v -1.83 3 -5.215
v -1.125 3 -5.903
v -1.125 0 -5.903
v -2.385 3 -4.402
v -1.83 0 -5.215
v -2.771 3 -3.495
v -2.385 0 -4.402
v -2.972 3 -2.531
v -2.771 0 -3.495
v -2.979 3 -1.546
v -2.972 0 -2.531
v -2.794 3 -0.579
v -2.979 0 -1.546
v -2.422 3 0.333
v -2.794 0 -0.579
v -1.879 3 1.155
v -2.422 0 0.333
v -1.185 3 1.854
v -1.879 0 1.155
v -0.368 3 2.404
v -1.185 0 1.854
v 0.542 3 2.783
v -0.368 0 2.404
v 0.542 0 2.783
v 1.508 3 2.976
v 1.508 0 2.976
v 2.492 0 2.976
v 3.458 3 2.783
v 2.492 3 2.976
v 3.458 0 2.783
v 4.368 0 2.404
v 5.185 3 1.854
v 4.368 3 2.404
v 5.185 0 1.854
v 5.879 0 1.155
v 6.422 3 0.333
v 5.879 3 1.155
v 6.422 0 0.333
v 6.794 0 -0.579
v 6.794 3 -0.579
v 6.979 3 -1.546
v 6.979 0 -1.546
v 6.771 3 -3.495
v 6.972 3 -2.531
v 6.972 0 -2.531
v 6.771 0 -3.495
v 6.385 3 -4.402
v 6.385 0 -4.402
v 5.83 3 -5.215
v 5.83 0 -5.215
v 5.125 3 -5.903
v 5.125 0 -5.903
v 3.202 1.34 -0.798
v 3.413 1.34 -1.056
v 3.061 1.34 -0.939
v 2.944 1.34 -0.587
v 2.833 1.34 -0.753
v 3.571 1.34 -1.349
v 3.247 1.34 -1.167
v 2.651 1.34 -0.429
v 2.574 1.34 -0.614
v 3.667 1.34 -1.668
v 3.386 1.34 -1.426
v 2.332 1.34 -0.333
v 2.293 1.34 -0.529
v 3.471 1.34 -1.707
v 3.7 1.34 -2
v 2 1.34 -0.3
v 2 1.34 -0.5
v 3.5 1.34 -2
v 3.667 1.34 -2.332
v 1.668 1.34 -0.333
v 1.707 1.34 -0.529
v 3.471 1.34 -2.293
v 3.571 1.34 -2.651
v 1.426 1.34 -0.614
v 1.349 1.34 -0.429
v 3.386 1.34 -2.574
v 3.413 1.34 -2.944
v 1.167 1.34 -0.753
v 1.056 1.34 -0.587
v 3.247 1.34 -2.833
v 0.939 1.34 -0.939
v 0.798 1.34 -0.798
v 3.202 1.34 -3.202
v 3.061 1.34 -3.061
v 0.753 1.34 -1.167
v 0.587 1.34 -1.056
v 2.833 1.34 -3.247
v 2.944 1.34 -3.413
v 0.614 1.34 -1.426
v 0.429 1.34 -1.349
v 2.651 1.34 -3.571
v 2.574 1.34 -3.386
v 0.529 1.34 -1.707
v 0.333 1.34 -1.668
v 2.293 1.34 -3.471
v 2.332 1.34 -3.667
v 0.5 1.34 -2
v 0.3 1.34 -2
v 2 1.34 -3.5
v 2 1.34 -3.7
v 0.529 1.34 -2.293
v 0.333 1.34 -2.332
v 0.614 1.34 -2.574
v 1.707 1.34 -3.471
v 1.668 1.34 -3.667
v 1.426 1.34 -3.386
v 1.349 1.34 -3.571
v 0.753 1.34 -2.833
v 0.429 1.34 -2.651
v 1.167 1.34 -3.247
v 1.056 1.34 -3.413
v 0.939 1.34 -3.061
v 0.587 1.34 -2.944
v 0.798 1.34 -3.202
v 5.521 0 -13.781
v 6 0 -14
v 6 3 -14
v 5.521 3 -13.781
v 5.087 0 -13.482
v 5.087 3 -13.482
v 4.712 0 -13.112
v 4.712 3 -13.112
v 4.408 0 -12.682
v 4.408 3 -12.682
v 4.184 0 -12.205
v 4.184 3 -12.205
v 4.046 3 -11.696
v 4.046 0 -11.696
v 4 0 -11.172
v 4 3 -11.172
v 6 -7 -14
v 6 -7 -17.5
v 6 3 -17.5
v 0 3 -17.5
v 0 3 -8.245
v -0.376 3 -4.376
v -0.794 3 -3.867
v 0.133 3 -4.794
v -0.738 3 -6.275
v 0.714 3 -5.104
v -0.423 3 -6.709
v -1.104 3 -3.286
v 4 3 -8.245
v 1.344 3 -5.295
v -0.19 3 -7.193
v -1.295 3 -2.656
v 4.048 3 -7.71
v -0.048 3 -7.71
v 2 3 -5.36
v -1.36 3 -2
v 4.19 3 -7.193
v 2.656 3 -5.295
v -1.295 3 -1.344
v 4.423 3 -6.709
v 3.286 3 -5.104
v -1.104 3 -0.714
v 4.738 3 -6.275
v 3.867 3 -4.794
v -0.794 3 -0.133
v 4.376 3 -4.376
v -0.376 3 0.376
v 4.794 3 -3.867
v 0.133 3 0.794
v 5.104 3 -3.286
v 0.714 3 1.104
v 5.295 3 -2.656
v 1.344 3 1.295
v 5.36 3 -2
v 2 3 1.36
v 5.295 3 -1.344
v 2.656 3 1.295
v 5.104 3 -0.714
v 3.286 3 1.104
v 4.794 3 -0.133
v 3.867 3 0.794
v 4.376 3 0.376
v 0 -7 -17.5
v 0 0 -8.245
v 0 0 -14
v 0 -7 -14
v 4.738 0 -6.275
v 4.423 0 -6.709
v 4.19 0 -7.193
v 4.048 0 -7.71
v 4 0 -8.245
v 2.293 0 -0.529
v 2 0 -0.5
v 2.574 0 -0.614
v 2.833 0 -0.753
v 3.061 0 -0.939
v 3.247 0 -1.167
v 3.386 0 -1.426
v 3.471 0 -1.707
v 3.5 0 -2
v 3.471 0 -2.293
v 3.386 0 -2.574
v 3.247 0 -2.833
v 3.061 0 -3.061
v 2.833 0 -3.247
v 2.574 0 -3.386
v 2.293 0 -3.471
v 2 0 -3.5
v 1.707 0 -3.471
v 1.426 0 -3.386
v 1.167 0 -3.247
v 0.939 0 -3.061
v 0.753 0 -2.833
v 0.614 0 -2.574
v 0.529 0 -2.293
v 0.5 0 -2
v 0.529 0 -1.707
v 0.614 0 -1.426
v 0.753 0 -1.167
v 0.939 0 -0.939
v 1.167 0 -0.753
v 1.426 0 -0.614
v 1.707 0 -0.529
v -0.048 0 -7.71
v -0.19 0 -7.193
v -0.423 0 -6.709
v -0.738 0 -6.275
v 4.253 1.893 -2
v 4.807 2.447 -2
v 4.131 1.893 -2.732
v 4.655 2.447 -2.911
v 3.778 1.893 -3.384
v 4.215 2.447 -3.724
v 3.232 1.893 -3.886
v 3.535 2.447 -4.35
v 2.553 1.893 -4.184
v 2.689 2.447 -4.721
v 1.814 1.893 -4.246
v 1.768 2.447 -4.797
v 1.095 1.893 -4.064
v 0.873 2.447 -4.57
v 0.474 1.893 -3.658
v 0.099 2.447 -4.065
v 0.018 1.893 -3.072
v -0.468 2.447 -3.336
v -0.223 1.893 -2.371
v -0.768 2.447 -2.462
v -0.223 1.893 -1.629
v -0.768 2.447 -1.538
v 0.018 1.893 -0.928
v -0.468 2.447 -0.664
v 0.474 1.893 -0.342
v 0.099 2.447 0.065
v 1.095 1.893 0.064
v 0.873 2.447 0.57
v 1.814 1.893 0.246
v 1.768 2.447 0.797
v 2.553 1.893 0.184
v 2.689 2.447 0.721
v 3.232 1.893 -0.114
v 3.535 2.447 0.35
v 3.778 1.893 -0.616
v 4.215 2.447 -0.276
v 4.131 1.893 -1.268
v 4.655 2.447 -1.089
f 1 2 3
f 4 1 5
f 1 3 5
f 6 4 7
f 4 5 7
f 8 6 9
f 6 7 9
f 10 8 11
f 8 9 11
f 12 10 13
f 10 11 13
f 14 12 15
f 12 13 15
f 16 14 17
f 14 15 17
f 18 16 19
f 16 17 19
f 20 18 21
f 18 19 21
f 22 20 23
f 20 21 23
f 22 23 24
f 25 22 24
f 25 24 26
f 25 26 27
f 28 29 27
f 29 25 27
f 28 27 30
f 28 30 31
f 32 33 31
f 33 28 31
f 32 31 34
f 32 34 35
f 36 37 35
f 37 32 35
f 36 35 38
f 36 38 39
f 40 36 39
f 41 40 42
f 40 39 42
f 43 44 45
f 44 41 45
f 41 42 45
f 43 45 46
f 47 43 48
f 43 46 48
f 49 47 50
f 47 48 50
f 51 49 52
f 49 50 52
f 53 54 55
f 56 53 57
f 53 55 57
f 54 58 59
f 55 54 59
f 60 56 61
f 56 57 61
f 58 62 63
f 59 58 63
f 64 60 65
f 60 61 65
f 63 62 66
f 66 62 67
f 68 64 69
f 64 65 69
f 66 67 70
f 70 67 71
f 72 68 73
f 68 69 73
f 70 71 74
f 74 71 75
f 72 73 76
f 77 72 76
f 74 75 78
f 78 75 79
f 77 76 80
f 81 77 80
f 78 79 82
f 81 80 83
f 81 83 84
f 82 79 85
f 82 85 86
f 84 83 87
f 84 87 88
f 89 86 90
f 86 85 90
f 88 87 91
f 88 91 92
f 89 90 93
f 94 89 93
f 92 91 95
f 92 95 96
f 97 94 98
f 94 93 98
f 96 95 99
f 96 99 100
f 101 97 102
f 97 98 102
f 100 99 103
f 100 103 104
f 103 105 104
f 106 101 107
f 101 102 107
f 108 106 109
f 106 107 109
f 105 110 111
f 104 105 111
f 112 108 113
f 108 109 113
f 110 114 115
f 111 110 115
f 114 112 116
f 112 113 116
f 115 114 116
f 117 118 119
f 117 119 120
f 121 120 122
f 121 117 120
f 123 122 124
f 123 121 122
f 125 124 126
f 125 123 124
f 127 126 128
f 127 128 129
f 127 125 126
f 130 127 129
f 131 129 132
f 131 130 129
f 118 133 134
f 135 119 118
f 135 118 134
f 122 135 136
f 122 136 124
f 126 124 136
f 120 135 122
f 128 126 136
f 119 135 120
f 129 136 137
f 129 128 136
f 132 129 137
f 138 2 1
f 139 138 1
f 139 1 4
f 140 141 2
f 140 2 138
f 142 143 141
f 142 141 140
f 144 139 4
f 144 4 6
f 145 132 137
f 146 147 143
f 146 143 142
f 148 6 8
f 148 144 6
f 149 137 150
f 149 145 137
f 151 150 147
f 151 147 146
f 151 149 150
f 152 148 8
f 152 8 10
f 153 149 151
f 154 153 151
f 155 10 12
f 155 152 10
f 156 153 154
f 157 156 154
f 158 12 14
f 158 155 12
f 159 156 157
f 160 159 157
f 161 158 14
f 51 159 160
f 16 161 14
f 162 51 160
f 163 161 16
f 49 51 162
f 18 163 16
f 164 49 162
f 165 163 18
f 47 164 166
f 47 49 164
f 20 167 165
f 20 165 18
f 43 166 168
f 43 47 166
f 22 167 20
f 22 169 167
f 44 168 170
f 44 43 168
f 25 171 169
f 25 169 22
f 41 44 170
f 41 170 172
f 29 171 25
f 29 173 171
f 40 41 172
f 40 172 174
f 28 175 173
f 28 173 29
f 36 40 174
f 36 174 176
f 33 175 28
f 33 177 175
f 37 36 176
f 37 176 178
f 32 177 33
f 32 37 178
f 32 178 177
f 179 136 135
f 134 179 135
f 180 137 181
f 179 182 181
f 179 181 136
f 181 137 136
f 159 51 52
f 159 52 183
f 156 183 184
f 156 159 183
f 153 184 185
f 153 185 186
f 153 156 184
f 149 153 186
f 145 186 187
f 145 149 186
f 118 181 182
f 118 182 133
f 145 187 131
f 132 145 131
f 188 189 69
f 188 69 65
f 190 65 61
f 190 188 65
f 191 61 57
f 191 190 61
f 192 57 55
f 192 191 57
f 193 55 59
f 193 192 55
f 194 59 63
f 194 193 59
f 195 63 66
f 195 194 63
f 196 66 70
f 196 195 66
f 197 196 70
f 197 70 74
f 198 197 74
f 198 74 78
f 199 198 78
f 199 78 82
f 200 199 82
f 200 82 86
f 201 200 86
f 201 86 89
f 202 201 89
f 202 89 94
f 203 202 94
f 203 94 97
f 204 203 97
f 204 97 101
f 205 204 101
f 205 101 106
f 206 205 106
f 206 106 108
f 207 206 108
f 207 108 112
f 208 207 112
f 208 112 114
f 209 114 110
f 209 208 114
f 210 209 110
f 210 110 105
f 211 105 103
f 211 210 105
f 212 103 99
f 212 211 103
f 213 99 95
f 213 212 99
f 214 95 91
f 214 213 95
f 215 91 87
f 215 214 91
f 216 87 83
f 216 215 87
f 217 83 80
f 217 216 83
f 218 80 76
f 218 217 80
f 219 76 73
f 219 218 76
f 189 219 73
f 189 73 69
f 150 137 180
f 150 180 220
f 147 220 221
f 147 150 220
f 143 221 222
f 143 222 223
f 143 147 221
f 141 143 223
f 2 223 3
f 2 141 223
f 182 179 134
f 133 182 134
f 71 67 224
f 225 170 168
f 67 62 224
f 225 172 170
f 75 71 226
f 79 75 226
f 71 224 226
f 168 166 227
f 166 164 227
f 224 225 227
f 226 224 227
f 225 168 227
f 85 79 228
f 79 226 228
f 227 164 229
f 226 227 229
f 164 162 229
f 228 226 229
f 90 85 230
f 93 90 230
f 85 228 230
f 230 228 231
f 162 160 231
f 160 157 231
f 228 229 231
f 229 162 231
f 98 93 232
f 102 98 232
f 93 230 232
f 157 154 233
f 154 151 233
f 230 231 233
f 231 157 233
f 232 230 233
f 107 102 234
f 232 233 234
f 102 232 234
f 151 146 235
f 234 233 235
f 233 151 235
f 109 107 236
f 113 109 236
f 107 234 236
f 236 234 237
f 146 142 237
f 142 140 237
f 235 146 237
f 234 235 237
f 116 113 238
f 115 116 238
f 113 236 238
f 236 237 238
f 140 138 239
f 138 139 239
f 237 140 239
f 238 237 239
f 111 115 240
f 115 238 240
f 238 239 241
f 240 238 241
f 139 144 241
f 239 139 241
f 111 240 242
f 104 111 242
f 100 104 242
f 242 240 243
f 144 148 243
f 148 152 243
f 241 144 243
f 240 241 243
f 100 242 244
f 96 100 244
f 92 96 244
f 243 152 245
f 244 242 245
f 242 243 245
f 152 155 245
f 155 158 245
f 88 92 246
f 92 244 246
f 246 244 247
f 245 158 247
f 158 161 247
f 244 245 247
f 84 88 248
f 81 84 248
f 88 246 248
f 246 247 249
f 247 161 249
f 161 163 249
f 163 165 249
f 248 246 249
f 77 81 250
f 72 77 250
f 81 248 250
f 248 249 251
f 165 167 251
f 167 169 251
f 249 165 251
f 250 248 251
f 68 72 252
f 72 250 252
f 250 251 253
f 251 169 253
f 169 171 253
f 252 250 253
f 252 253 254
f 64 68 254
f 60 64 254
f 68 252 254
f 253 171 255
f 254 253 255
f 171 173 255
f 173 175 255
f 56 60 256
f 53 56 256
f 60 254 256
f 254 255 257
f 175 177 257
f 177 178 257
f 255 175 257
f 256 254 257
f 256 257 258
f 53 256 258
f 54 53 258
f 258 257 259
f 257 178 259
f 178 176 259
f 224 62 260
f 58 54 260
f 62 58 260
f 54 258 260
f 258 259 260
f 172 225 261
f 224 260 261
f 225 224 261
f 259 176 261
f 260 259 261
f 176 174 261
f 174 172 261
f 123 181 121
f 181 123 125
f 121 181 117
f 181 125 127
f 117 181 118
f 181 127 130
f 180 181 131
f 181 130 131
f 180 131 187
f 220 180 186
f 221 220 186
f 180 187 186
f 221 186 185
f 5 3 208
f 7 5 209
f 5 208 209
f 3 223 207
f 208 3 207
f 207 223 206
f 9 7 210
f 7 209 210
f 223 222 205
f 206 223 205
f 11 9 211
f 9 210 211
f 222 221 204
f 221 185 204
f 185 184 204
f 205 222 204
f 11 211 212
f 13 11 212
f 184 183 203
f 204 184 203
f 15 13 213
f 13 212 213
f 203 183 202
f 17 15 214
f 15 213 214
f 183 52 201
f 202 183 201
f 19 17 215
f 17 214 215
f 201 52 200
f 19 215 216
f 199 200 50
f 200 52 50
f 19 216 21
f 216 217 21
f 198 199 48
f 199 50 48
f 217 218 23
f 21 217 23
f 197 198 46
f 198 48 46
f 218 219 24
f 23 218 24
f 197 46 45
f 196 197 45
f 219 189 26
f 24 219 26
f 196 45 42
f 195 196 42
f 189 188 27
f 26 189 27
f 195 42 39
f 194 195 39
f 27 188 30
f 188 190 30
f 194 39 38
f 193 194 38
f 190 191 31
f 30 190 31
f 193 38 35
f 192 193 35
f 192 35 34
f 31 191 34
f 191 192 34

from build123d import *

# Parameters (mm, degrees)
CROQUIS1_W              = 4
CROQUIS1_H              = 14
CROQUIS1_R              = 1.5
SALIENTE_EXTRUIR1_DEPTH = 3
CROQUIS2_W              = 6
CROQUIS2_H              = 3.5
SALIENTE_EXTRUIR2_DEPTH = 10
SALIENTE_EXTRUIR3_START = -3
CROQUIS3_R              = 5
CROQUIS3_R_2            = 1.5
SALIENTE_EXTRUIR3_DEPTH = 3
REDONDEO1_R             = 3


# Read off the part's stored shape, not the designer's step: TaladroAvanzado1
with BuildPart() as part:
    # Croquis1 → Saliente-Extruir1 (new body)
    with BuildSketch(Plane(origin=(0, 0, 0), x_dir=(1, 0, 0), z_dir=(0, 1, 0))):
        with Locations((2, 7)):
            Rectangle(CROQUIS1_W, CROQUIS1_H)
        with Locations(Location((2, 2, 0), (0, 0, 270))):
            Circle(CROQUIS1_R, mode=Mode.SUBTRACT)
    extrude(amount=SALIENTE_EXTRUIR1_DEPTH)

    # Croquis2 → Saliente-Extruir2 (add)
    with BuildSketch(Plane(origin=(0, 3, 0), x_dir=(1, 0, 0), z_dir=(0, 1, 0))):
        with Locations((3, 15.75)):
            Rectangle(CROQUIS2_W, CROQUIS2_H)
    extrude(amount=-SALIENTE_EXTRUIR2_DEPTH)

    # Croquis3 → Saliente-Extruir3 (add)
    with BuildSketch(Plane(origin=(0, 3, 0), x_dir=(1, 0, 0), z_dir=(0, 1, 0)).offset(SALIENTE_EXTRUIR3_START)):
        with Locations((2, 2)):
            Circle(CROQUIS3_R)
        with Locations(Location((2, 2, 0), (0, 0, 270))):
            Circle(CROQUIS3_R_2, mode=Mode.SUBTRACT)
    extrude(amount=SALIENTE_EXTRUIR3_DEPTH)

    # TaladroAvanzado1 outline → TaladroAvanzado1 (revolve, cut)
    with BuildSketch(Plane(origin=(2, 0, -2), x_dir=(1, 0, 0), z_dir=(0, 0, 1))):
        Polygon((1.5, 1.34), (1.7, 1.34), (3.36, 3), (1.5, 3), align=None)
    revolve(axis=Axis((2, 0, -2), (0, 1, 0)), mode=Mode.SUBTRACT)

    # Redondeo1
    # the kernel refuses this fillet: 3 mm, written as the material it adds along each edge
    with BuildSketch(Plane(origin=(4, 0, -14), x_dir=(1, 0, 0), z_dir=(0, 1, 0))) as redondeo1_piece_1:
        with BuildLine():
            CenterArc((3, -2.828427125), REDONDEO1_R, 109.471220634, 70.528779366)
            Line((0, -2.828427125), (-0.06, -2.828427125))
            Line((-0.06, -2.828427125), (-0.06, 0))
            Line((-0.06, 0), (0, 0.06))
            ThreePointArc((0, 0.06), (1, 0.06), (1.98, 0.056568542))
            Line((1.98, 0.056568542), (2, 0))
        make_face()
    extrude(amount=3)
    with BuildSketch(Plane(origin=(4, 3, -6.582575695), x_dir=(0, 0, -1), z_dir=(0, -1, 0))) as redondeo1_piece_2:
        with BuildLine():
            CenterArc((1.662422303, 3), REDONDEO1_R, 218.682187453, 51.317812547)
            Line((-0.679451946, 1.125), (-0.726289431, 1.0875))
            ThreePointArc((-0.726289431, 1.0875), (-0.353961086, 0.5539026), (-0.054990908, -0.024))
            Line((-0.054990908, -0.024), (0, -0.06))
            Line((0, -0.06), (1.662422303, -0.06))
            Line((1.662422303, -0.06), (1.662422303, 0))
        make_face()
    extrude(amount=3)
    with BuildSketch(Plane(origin=(0, 3, -6.582575695), x_dir=(0, 0, -1), z_dir=(0, -1, 0))) as redondeo1_piece_3:
        with BuildLine():
            CenterArc((1.662422303, -3), REDONDEO1_R, 90, 51.317812547)
            Line((-0.679451946, -1.125), (-0.726289431, -1.0875))
            ThreePointArc((-0.726289431, -1.0875), (-0.353961086, -0.5539026), (-0.054990908, 0.024))
            Line((-0.054990908, 0.024), (0, 0.06))
            Line((0, 0.06), (1.662422303, 0.06))
            Line((1.662422303, 0.06), (1.662422303, 0))
        make_face()
    extrude(amount=3)


solid = part.part
